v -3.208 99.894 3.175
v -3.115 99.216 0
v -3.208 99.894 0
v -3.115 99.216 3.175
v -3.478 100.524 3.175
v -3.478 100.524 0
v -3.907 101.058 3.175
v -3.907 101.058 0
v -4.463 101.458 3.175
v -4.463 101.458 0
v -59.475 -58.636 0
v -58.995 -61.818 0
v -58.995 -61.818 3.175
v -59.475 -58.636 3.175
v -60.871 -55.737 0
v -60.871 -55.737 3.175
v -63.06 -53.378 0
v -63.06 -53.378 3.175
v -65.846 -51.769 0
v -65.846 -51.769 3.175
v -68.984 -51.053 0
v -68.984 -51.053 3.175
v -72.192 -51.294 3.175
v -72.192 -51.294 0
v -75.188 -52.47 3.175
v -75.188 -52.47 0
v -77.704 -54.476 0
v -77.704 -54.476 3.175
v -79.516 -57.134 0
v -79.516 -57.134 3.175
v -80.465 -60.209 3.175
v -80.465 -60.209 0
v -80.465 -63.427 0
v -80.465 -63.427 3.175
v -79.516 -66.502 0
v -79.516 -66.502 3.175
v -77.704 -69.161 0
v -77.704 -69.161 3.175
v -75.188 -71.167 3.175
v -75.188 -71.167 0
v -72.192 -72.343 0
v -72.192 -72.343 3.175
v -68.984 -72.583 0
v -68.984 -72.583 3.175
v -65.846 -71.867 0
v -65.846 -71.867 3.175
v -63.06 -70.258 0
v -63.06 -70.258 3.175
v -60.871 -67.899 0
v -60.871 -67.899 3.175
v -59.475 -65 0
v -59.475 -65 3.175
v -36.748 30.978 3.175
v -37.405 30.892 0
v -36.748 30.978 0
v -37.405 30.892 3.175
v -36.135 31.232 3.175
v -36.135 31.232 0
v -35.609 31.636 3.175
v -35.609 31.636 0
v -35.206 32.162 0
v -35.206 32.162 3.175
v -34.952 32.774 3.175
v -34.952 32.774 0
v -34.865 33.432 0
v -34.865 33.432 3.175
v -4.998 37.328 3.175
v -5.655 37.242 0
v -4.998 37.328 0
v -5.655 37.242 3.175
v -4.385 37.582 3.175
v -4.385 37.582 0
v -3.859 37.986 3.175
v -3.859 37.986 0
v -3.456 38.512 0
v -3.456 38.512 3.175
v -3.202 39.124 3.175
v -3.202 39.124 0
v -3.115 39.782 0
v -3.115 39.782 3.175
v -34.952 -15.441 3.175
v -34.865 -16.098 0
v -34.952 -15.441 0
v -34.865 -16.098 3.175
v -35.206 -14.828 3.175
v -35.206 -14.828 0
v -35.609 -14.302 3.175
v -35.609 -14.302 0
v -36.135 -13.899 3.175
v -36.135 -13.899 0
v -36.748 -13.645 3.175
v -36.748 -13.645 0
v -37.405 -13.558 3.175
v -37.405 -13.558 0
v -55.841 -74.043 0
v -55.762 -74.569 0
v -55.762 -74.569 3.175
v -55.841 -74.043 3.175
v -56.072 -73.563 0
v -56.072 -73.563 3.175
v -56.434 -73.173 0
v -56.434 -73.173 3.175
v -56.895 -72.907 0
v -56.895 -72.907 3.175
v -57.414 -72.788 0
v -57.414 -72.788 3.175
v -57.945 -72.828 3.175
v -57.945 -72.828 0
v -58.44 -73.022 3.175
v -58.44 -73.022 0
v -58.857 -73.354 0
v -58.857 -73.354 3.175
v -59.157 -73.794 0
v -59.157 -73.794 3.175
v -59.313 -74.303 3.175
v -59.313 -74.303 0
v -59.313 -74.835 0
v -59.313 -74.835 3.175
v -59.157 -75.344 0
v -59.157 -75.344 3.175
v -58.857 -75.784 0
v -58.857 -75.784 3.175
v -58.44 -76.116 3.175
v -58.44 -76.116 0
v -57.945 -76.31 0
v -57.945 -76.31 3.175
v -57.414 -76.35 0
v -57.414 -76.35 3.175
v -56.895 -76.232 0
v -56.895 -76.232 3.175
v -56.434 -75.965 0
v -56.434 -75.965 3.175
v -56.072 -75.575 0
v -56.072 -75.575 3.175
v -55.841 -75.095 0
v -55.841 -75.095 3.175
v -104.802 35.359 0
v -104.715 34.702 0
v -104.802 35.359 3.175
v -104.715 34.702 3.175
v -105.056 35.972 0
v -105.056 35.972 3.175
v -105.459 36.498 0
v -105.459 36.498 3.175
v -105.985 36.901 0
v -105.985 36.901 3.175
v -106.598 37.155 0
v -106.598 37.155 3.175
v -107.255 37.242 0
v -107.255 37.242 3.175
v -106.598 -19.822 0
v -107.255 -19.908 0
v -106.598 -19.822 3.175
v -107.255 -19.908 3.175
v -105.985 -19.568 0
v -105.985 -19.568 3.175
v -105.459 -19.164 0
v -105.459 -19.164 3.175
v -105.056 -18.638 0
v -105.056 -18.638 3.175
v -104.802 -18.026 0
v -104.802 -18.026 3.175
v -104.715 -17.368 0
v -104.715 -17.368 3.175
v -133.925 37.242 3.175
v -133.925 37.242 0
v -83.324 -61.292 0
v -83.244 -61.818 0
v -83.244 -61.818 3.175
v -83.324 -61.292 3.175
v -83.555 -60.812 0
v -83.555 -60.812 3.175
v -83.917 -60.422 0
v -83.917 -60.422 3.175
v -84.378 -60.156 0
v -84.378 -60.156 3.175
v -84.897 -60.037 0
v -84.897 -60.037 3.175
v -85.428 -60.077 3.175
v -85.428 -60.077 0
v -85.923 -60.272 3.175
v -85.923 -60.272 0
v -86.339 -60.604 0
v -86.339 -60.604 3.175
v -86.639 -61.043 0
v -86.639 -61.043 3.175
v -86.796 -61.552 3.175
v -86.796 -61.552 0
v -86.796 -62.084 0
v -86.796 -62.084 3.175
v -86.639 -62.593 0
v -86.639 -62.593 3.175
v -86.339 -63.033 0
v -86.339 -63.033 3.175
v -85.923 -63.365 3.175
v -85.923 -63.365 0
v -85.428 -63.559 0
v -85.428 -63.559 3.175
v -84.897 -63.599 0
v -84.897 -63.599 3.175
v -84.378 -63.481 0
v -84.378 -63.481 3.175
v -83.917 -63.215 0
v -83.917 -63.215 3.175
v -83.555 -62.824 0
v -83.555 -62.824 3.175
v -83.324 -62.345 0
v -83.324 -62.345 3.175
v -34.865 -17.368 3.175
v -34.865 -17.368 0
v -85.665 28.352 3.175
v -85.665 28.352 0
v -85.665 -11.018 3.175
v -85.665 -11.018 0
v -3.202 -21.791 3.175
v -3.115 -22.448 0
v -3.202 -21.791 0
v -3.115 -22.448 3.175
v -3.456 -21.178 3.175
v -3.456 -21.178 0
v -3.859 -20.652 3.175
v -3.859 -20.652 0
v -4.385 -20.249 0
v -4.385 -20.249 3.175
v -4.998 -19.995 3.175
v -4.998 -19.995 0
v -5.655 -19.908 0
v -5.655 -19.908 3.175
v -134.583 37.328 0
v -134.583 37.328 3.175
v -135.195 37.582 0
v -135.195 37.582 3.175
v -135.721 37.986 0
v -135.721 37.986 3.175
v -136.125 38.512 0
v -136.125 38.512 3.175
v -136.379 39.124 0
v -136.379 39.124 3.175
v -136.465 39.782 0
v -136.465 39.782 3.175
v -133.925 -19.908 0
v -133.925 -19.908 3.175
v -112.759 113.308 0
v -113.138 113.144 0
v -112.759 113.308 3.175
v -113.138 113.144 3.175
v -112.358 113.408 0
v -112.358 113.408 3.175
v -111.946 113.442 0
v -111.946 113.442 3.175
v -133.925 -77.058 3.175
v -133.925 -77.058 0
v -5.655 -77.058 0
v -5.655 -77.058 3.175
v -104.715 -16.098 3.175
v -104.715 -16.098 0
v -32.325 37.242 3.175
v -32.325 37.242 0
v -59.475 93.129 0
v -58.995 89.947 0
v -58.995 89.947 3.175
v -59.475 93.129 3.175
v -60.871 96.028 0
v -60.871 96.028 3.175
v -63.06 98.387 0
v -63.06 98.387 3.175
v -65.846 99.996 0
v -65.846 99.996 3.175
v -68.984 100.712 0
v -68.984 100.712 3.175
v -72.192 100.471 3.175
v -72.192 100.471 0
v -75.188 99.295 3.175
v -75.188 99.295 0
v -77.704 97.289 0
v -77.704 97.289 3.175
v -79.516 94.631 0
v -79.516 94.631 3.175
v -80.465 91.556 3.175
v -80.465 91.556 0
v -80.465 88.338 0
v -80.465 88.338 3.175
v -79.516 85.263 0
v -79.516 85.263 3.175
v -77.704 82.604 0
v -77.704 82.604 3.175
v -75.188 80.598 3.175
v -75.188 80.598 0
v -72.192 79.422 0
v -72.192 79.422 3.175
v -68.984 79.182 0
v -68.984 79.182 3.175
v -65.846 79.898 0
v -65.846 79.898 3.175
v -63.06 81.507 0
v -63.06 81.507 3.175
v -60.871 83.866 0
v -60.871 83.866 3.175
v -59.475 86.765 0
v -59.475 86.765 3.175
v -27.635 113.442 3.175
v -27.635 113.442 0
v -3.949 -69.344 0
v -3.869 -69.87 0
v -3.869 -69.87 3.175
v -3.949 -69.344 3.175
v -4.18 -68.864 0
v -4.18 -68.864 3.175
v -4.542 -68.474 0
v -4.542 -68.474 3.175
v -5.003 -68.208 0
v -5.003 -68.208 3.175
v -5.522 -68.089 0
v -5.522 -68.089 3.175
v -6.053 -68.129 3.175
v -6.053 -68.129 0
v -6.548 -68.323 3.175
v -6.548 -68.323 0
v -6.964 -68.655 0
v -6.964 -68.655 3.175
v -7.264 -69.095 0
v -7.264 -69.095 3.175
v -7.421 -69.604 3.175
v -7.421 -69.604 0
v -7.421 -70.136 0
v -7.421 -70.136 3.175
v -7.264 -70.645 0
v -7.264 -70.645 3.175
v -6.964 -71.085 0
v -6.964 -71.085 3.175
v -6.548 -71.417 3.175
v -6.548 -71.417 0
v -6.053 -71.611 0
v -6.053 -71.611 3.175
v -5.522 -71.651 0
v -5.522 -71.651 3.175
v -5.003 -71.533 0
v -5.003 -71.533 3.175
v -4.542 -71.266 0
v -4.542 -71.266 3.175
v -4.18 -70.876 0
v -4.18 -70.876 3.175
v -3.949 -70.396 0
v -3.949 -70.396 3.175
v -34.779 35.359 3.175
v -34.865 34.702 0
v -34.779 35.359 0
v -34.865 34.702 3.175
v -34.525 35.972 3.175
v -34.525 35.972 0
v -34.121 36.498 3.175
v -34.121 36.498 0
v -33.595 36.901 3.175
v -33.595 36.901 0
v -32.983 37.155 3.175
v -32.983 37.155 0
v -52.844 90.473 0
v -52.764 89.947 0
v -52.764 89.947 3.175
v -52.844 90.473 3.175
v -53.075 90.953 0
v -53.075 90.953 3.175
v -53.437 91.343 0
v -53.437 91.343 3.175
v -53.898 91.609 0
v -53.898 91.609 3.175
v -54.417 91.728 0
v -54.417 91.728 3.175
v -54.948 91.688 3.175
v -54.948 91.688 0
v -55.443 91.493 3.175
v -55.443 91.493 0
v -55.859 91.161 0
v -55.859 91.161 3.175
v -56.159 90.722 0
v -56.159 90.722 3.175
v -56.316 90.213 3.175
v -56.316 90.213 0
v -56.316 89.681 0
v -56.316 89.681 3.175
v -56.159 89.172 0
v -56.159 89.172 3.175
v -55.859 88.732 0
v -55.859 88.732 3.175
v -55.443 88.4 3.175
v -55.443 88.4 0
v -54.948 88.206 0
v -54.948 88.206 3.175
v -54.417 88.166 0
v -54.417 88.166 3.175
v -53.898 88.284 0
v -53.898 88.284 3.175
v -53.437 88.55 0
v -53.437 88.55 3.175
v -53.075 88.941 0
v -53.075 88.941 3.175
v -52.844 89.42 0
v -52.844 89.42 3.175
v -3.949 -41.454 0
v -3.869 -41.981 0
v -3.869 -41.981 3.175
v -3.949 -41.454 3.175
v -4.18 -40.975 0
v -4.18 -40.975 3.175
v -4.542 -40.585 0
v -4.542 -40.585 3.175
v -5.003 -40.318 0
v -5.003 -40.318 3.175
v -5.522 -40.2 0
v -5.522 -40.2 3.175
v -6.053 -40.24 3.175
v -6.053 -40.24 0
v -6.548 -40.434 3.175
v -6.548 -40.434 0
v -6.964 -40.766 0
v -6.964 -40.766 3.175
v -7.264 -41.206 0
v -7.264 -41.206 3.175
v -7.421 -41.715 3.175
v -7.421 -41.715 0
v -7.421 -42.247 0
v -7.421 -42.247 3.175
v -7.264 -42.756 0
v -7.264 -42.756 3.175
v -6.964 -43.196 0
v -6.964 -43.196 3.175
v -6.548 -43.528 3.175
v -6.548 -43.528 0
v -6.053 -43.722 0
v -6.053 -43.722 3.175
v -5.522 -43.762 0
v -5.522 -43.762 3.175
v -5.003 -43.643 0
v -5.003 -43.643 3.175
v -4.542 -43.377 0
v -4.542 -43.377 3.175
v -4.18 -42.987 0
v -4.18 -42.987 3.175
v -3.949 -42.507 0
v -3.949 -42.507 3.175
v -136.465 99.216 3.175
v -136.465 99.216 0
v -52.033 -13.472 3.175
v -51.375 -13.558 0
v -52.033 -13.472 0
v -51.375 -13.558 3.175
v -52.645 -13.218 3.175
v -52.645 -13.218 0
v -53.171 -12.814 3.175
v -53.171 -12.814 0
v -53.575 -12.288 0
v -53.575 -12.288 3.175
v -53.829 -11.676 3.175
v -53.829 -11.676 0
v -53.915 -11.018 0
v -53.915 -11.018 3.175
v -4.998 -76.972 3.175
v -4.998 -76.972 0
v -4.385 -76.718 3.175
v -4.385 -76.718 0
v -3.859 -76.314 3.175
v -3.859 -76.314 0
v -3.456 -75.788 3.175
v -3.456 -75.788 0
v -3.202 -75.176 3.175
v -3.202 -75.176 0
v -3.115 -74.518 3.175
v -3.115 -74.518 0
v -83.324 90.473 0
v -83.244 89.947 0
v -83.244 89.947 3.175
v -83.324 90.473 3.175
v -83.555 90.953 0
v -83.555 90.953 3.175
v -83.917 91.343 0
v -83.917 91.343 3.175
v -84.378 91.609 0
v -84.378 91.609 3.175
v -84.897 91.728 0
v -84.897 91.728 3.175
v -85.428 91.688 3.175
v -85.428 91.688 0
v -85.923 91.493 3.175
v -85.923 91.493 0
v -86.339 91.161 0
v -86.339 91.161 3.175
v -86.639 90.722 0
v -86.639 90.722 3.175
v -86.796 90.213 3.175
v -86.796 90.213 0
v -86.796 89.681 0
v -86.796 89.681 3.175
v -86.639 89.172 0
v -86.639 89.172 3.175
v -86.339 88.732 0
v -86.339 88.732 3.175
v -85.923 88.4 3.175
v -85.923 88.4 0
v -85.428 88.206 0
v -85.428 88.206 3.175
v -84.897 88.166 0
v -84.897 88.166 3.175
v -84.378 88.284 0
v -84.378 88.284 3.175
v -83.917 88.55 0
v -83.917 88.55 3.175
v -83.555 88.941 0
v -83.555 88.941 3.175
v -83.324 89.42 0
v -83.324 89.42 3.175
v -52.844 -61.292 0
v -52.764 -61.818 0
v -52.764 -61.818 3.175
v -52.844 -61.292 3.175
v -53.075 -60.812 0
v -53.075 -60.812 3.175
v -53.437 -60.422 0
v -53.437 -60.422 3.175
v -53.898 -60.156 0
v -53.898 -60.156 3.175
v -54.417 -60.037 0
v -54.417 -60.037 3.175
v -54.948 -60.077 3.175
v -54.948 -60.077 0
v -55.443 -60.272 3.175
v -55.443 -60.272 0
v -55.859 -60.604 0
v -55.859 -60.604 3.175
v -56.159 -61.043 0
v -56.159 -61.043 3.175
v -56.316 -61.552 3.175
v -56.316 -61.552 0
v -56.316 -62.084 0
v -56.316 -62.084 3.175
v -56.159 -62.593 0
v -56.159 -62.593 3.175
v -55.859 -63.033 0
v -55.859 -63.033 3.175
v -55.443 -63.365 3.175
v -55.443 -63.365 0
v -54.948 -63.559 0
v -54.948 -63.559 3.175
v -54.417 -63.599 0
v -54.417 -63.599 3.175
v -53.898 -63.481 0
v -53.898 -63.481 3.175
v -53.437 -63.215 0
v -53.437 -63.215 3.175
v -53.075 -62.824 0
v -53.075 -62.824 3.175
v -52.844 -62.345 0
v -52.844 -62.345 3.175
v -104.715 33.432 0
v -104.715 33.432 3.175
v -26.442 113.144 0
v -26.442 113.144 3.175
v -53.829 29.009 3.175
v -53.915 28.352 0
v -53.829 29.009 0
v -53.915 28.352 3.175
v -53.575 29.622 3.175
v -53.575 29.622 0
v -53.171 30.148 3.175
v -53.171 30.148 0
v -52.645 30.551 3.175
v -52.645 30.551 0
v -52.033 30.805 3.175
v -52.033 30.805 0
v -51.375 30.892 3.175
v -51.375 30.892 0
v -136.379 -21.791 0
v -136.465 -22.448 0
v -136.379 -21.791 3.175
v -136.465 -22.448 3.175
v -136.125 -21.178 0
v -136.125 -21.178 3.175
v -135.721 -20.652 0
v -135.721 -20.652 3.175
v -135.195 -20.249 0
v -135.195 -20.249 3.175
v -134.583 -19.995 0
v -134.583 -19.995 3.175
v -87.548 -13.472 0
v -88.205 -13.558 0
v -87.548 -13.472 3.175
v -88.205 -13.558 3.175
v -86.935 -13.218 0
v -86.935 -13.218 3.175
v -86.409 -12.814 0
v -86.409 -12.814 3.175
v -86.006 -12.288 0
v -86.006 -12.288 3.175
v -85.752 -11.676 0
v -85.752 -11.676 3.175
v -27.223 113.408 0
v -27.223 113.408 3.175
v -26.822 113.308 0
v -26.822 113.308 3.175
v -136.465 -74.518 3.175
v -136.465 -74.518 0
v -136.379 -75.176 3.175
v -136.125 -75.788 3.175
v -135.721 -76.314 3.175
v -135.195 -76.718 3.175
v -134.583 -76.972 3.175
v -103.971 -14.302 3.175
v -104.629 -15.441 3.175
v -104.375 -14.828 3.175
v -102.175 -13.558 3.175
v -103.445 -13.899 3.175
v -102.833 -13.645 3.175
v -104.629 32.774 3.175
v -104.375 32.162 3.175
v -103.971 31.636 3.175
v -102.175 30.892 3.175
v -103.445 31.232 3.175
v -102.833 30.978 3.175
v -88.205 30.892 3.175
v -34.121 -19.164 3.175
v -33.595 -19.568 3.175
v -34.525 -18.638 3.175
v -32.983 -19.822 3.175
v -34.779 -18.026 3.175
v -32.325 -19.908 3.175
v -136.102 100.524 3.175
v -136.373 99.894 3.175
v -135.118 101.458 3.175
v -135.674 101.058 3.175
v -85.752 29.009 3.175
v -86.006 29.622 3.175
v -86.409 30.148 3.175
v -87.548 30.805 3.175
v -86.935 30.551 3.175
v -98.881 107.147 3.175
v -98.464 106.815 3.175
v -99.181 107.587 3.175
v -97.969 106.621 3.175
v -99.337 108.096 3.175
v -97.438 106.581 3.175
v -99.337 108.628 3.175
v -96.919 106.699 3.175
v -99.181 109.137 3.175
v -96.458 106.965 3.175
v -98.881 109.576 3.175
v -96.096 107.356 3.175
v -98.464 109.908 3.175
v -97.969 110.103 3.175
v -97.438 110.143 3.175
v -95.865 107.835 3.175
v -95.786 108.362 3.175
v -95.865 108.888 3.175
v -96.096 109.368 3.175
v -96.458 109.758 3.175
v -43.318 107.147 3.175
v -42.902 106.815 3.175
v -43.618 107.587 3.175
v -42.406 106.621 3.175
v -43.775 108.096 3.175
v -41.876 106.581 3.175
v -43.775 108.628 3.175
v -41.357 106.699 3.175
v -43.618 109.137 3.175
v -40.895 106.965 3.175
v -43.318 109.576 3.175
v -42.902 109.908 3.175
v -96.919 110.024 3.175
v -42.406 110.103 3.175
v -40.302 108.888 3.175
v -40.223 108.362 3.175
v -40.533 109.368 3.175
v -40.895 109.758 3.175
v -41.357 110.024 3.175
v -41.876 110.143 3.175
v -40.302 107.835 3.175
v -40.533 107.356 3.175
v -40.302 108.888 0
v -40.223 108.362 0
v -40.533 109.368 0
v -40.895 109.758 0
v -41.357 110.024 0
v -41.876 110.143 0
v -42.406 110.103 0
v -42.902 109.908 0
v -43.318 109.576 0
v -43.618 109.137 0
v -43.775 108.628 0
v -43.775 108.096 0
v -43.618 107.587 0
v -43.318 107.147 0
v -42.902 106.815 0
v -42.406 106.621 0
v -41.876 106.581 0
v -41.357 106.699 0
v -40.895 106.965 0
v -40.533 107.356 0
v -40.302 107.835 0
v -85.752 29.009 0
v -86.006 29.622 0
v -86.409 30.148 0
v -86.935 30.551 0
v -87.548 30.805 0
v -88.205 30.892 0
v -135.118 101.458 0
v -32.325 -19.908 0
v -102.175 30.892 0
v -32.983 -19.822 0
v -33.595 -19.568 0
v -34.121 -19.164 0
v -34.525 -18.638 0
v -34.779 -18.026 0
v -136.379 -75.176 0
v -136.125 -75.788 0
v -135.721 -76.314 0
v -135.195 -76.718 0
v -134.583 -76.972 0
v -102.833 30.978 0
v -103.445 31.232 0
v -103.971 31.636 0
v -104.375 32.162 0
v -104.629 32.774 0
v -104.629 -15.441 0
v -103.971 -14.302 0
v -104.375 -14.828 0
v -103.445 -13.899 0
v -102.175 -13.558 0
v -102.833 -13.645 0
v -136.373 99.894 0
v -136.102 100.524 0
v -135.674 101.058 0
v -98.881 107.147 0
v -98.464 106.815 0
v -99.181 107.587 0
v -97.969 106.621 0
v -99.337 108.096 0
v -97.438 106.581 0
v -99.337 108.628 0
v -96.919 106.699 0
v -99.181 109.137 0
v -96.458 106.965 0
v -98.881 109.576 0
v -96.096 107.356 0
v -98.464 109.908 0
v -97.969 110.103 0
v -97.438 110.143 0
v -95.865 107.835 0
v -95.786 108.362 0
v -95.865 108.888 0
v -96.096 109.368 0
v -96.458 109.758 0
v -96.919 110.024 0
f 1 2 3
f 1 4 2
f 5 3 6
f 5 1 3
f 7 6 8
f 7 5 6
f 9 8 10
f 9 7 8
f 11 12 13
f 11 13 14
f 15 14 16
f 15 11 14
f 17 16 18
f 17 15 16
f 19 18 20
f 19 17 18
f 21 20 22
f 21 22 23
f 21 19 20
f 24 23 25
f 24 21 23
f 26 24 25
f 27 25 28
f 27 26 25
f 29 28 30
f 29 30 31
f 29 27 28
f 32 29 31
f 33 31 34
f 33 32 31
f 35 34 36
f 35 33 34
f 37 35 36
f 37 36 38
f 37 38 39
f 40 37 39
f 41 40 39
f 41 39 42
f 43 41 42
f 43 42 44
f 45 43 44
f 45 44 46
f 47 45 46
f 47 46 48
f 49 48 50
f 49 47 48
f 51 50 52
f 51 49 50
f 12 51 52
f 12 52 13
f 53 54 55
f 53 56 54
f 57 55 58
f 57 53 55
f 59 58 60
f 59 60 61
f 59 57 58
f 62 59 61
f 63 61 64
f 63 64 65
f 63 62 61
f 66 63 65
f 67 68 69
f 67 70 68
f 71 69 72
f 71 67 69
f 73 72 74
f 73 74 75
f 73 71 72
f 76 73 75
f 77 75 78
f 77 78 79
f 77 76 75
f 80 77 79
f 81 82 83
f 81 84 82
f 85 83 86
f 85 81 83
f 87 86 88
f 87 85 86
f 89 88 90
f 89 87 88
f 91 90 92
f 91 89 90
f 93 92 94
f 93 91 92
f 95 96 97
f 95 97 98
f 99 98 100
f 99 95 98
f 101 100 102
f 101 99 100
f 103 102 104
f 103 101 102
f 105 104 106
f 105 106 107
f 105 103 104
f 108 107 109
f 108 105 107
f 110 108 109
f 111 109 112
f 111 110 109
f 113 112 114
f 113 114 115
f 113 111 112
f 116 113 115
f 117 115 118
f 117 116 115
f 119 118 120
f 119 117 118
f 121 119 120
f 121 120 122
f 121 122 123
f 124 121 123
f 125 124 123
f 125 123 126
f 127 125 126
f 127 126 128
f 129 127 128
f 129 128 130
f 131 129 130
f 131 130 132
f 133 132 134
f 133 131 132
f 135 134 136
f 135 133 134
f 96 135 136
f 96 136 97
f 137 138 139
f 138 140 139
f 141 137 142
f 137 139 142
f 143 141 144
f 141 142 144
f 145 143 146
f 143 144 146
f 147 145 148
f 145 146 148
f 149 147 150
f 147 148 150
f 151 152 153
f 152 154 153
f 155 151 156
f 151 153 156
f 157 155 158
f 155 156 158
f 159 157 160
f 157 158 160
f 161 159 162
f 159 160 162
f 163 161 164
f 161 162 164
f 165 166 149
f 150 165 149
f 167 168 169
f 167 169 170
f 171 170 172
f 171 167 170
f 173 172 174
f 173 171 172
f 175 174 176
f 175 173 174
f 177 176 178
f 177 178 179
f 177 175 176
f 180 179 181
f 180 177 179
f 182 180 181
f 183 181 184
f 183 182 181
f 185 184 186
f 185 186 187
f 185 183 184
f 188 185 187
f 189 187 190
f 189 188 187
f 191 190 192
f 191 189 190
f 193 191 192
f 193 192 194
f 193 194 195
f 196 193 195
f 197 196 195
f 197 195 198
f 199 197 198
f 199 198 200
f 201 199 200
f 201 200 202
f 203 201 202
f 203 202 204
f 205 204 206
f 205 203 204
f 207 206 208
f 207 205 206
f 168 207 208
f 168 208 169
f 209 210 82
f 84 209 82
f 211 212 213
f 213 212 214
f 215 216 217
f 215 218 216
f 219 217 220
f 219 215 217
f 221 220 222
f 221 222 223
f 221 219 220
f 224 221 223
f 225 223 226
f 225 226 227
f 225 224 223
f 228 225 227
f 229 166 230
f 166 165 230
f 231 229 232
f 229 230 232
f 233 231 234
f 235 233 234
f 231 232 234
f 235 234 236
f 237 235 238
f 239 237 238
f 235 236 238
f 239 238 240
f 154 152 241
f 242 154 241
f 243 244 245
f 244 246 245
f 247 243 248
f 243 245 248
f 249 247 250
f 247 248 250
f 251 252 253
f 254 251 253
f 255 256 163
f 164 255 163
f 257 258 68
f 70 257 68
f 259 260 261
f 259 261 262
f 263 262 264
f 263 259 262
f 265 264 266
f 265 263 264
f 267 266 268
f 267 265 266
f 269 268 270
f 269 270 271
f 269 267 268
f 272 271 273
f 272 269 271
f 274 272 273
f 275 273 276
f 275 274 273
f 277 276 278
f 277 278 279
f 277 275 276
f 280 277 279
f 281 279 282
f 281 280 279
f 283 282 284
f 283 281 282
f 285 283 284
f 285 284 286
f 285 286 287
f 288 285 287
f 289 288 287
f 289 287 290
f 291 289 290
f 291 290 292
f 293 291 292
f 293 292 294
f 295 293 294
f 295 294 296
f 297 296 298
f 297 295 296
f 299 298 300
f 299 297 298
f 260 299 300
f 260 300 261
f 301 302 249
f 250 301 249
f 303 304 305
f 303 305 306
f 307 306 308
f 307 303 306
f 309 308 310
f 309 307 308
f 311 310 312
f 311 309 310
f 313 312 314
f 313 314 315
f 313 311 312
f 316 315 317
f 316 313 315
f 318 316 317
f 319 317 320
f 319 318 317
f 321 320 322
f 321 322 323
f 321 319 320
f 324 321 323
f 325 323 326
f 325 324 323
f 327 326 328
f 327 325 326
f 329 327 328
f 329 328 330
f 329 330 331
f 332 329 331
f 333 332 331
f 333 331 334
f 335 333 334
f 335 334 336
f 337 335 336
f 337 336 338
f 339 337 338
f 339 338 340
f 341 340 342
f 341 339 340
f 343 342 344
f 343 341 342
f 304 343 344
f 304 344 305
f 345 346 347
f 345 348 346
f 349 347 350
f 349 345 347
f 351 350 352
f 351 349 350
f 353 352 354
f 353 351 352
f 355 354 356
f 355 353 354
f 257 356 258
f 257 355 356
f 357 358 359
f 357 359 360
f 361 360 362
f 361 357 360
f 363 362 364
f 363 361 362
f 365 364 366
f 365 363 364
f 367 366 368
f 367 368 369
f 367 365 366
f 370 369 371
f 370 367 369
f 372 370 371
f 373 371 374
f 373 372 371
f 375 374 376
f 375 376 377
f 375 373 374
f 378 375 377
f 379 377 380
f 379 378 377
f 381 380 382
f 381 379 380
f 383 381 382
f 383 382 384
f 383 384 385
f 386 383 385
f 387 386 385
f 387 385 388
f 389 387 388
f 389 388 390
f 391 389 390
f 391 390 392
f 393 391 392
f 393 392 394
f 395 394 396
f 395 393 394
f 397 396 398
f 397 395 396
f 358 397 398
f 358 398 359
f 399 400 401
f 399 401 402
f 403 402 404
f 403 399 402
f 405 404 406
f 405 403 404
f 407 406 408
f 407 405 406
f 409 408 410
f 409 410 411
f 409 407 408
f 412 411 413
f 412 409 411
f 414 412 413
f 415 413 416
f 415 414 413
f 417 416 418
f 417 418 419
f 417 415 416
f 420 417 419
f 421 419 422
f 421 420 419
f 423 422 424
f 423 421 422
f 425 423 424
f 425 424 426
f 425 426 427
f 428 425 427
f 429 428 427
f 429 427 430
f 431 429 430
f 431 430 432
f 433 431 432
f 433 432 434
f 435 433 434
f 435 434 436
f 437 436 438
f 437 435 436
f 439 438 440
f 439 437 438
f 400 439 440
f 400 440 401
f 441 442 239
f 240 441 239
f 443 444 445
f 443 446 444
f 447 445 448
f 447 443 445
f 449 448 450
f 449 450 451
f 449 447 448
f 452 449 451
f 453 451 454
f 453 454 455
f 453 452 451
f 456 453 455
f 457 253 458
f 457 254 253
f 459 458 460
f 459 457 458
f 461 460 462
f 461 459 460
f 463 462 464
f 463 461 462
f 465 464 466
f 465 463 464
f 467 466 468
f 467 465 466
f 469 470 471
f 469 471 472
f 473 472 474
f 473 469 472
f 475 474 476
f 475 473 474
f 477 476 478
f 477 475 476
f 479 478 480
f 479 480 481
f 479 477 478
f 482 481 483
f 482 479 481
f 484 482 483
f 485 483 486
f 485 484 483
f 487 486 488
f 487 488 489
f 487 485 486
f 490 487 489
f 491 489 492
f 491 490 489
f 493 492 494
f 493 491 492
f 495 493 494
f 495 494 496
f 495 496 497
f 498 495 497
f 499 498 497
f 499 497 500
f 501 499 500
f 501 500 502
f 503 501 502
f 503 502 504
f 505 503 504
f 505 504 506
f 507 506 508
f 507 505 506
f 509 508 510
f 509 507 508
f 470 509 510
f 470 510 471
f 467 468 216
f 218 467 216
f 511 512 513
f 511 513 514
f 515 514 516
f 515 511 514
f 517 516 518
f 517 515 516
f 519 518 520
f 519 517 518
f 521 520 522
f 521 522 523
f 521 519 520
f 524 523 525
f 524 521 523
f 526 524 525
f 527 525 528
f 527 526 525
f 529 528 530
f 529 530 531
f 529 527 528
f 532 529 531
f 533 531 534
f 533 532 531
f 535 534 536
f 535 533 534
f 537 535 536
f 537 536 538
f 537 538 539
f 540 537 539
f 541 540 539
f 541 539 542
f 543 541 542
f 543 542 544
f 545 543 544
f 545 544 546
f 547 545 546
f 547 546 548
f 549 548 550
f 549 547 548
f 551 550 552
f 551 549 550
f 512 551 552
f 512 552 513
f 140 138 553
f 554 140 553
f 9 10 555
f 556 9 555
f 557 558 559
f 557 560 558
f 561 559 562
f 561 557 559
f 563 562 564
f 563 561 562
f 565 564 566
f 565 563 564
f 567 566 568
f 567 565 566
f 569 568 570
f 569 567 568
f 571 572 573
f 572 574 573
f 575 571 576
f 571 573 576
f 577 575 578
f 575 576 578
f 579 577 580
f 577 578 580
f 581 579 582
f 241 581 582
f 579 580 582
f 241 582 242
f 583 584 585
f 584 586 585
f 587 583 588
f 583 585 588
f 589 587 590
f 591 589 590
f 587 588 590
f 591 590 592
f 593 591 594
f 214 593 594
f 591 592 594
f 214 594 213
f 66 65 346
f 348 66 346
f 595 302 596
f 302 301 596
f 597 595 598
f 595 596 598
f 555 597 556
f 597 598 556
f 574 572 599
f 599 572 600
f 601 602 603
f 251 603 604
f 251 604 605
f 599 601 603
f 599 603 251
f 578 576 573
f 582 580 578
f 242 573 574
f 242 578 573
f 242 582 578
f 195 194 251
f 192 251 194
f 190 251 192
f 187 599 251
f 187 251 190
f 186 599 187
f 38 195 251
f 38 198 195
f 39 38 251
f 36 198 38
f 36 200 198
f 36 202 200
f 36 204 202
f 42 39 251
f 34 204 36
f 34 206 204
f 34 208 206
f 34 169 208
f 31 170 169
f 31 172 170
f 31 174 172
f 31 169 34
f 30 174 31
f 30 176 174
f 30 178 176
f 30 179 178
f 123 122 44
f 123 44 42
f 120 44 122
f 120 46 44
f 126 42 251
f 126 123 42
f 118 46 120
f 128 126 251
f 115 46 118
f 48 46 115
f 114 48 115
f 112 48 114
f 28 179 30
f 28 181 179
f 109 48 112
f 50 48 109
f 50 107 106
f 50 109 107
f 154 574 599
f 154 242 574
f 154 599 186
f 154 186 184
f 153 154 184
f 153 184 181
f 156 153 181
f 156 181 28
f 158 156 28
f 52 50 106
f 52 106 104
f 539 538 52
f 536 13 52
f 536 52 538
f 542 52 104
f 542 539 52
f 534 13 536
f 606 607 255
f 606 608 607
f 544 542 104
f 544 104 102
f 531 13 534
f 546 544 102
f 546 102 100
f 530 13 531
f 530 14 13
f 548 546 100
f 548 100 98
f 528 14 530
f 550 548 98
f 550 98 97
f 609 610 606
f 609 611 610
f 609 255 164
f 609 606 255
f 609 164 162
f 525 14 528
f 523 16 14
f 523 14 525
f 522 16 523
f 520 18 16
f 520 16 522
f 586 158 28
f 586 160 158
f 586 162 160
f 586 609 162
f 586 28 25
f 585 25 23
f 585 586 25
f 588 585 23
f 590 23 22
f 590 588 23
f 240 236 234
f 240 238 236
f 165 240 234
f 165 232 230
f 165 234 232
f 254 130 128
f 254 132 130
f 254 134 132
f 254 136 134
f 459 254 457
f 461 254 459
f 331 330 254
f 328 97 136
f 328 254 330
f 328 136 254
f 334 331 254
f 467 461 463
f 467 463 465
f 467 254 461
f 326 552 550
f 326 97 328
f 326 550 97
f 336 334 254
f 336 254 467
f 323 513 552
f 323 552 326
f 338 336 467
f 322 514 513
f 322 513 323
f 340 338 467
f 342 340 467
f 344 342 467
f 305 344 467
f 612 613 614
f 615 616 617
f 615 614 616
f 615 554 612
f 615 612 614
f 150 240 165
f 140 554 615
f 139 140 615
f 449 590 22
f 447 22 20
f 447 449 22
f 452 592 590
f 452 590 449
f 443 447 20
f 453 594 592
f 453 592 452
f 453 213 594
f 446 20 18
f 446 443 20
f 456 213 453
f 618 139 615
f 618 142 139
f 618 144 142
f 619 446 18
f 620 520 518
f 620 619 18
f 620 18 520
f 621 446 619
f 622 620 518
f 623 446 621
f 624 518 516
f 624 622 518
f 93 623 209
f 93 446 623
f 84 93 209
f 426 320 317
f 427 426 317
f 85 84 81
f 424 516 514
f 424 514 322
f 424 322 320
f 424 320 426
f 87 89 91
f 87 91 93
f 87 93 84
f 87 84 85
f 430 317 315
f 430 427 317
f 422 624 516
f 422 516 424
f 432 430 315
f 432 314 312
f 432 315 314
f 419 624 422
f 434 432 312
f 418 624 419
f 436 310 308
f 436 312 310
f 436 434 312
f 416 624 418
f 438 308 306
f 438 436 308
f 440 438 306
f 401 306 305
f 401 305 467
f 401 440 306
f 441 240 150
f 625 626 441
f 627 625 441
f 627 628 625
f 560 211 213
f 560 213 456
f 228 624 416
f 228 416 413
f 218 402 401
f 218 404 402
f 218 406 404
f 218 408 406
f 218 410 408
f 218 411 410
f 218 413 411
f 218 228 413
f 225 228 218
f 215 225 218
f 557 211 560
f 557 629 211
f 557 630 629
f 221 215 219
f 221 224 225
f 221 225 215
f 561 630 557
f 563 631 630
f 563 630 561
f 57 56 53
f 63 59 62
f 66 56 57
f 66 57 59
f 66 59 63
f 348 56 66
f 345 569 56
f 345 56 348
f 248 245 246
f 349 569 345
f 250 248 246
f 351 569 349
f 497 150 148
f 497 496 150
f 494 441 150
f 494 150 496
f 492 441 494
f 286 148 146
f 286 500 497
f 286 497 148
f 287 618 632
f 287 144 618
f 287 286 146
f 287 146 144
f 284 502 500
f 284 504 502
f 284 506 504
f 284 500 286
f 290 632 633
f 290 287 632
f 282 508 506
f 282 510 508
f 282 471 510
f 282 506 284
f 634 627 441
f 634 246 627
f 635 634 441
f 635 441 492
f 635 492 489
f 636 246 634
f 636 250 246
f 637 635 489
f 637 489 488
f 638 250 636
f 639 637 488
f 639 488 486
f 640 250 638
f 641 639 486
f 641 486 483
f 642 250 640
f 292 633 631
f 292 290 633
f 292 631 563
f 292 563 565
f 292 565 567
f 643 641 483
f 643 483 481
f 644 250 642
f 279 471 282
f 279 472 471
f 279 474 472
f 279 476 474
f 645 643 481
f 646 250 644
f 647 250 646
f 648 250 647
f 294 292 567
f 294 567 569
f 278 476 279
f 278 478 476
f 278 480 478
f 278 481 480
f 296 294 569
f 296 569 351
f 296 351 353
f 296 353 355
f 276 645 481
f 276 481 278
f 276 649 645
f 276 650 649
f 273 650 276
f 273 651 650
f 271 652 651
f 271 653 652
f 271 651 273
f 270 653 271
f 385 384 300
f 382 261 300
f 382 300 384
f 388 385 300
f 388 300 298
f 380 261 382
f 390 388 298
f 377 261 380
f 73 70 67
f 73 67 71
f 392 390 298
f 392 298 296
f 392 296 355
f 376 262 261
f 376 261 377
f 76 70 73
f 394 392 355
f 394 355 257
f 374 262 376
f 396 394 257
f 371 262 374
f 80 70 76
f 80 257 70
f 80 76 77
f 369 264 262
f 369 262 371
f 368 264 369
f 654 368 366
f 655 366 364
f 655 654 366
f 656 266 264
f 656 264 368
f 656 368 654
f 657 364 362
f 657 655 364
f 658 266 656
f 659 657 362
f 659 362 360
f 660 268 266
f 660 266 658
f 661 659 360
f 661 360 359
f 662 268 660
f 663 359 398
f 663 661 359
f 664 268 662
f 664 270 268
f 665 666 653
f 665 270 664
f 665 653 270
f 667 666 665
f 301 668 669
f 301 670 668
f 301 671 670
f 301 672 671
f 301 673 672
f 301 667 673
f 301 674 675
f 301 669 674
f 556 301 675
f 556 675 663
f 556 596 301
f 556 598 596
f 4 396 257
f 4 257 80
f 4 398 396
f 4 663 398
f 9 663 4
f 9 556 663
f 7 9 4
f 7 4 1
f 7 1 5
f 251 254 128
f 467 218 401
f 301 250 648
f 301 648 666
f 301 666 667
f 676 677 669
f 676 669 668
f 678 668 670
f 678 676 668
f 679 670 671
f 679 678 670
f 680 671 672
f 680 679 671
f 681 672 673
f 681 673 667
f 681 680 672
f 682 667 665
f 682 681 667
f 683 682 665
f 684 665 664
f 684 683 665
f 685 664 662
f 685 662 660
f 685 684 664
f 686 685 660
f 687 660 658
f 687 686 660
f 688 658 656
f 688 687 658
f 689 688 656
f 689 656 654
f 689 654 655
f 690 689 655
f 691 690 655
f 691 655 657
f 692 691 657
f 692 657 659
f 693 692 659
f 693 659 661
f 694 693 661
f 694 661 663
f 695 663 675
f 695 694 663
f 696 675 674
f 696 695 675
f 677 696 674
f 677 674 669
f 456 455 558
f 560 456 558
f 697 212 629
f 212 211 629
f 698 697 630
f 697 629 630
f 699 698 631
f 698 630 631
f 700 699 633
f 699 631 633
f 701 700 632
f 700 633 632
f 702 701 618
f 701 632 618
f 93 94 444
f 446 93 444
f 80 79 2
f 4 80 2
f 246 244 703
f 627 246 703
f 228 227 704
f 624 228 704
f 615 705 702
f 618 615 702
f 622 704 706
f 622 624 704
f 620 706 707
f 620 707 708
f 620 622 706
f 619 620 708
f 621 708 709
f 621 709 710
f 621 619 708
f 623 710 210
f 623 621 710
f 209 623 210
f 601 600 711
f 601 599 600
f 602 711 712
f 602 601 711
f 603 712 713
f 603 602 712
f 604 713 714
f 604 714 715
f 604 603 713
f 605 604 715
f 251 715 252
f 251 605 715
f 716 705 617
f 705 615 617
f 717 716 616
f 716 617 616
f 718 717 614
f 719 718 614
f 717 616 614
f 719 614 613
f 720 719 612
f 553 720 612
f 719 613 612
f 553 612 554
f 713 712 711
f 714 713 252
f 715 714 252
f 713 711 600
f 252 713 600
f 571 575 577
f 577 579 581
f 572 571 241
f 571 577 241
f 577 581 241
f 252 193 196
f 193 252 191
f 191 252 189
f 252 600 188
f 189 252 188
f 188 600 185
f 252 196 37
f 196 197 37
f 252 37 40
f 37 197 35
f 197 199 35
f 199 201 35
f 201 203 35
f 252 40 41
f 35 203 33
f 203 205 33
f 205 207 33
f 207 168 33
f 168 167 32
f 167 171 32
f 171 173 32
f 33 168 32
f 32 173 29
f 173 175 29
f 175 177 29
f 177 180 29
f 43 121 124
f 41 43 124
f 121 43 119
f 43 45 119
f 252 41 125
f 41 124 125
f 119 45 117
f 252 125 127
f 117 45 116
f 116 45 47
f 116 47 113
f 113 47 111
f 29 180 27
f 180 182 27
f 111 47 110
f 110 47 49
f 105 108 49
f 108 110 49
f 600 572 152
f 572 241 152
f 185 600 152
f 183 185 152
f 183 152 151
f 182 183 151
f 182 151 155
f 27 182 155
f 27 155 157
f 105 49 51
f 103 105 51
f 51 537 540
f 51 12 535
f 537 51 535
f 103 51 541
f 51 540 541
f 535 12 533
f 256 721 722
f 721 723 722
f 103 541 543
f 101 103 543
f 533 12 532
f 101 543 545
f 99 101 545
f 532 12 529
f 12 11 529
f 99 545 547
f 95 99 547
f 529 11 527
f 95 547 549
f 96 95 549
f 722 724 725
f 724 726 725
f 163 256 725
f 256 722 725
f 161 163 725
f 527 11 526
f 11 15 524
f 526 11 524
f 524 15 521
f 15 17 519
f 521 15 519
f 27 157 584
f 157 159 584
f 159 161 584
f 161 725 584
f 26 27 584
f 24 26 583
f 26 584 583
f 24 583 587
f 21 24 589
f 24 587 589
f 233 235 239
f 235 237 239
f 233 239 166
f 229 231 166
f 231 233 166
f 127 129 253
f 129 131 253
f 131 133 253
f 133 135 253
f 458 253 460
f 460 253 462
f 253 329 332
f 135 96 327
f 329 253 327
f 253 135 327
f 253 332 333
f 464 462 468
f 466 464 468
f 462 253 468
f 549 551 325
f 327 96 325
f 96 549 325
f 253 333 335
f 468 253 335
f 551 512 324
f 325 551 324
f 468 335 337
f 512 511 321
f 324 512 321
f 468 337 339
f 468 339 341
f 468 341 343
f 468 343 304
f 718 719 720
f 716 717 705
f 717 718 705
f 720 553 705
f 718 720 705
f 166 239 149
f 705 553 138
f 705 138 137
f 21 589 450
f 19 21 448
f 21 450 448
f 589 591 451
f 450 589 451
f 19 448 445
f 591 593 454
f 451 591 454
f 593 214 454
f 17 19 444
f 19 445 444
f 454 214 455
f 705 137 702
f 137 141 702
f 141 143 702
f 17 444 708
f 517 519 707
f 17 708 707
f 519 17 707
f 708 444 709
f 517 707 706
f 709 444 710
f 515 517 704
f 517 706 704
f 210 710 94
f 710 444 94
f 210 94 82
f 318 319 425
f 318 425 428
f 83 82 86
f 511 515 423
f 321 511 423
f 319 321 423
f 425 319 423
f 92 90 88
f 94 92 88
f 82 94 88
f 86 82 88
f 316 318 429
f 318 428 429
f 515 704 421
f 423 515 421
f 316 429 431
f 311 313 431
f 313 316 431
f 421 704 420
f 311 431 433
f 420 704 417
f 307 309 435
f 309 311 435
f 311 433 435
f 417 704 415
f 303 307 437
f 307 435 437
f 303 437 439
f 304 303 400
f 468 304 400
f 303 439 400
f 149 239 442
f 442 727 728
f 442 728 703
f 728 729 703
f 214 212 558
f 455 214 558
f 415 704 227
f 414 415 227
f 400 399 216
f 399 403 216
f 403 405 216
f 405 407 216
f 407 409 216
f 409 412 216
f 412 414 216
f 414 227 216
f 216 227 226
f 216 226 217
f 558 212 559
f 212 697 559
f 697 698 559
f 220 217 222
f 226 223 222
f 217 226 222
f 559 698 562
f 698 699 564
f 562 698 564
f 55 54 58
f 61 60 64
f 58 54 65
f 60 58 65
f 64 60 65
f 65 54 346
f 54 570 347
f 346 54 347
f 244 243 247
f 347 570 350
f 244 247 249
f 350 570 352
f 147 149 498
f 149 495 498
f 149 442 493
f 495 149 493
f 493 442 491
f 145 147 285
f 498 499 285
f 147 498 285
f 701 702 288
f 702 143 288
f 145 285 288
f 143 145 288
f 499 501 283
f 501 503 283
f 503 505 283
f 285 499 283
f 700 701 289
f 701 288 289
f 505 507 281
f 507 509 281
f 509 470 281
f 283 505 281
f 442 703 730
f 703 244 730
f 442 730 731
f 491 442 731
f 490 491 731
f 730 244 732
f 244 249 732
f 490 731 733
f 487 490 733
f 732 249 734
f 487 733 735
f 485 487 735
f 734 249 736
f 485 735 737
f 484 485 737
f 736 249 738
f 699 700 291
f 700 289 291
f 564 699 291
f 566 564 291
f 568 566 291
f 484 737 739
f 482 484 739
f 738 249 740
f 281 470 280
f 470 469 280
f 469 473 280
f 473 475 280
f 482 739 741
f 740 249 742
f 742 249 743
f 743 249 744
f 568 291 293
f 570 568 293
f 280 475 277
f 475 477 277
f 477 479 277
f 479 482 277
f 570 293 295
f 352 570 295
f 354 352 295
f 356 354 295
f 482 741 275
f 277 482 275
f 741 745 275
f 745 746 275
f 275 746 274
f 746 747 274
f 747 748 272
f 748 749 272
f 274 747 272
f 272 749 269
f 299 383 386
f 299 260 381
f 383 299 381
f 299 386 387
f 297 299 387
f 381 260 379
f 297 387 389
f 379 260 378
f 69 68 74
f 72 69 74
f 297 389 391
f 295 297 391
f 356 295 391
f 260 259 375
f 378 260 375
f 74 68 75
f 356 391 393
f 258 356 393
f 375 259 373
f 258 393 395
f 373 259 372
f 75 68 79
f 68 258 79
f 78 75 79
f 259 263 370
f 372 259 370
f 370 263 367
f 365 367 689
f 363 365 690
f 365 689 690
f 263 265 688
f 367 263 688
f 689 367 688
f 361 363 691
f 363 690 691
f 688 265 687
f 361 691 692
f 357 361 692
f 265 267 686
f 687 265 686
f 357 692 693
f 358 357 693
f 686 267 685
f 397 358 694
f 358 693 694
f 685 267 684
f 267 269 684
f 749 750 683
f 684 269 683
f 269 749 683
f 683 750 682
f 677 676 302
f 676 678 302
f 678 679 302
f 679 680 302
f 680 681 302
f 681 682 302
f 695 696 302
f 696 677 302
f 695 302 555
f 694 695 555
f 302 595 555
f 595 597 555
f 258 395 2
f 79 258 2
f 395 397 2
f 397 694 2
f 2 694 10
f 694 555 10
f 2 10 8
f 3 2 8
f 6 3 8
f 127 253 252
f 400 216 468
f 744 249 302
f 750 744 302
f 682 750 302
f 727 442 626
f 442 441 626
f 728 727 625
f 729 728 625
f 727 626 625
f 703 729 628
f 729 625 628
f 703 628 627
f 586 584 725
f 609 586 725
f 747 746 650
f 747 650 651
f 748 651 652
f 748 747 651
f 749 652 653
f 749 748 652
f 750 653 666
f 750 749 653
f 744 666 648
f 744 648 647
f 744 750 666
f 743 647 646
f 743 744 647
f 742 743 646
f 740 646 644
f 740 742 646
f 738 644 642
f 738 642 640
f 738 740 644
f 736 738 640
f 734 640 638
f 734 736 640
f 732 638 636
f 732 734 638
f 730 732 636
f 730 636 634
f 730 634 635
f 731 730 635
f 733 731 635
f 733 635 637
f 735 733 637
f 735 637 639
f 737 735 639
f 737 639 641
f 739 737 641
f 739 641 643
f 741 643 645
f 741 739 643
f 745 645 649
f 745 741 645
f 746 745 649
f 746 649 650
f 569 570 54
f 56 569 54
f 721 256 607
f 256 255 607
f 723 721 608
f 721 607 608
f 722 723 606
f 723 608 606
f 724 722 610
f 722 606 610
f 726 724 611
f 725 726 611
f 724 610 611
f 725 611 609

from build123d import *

# Parameters (mm, degrees)
F0_R     = 1.7859375
F0_R_2   = 10.795
F1_DEPTH = 3.175
F2_R     = 2.54


with BuildPart() as f1:
    # F0 (on Top) → F1 (new body)
    with BuildSketch(Plane.XY):
        Polygon((-136.4652514458, -19.908263123), (-136.4652514458, -77.058263123), (-3.1152514458, -77.058263123), (-3.1152514458, -19.908263123), (-34.8652514458, -19.908263123), (-34.8652514458, -13.558263123), (-53.9152514458, -13.558263123), (-53.9152514458, 30.891736877), (-34.8652514458, 30.891736877), (-34.8652514458, 37.241736877), (-3.1152514458, 37.241736877), (-3.1152514458, 100.741736877), (-27.0015158653, 113.441736877), (-112.5789870262, 113.441736877), (-136.4652514458, 100.741736877), (-136.4652514458, 37.241736877), (-104.7152514458, 37.241736877), (-104.7152514458, 30.891736877), (-85.6652514458, 30.891736877), (-85.6652514458, -13.558263123), (-104.7152514458, -13.558263123), (-104.7152514458, -19.908263123), align=None)
        with Locations((-85.0302514458, -61.818263123)):
            Circle(F0_R, mode=Mode.SUBTRACT)
        with Locations((-57.5474514458, -74.569063123)):
            Circle(F0_R, mode=Mode.SUBTRACT)
        with Locations((-69.7902514458, -61.818263123)):
            Circle(F0_R_2, mode=Mode.SUBTRACT)
        with Locations((-54.5502514458, -61.818263123)):
            Circle(F0_R, mode=Mode.SUBTRACT)
        with Locations((-5.6552514458, -69.870063123)):
            Circle(F0_R, mode=Mode.SUBTRACT)
        with Locations((-5.6552514458, -41.980863123)):
            Circle(F0_R, mode=Mode.SUBTRACT)
        with Locations((-97.5715014458, 108.361736877)):
            Circle(F0_R, mode=Mode.SUBTRACT)
        with Locations((-85.0302514458, 89.946736877)):
            Circle(F0_R, mode=Mode.SUBTRACT)
        with Locations((-69.7902514458, 89.946736877)):
            Circle(F0_R_2, mode=Mode.SUBTRACT)
        with Locations((-54.5502514458, 89.946736877)):
            Circle(F0_R, mode=Mode.SUBTRACT)
        with Locations((-42.0090014458, 108.361736877)):
            Circle(F0_R, mode=Mode.SUBTRACT)
    extrude(amount=F1_DEPTH)

    # F2
    f2_edges = [f1.edges().sort_by_distance(p)[0] for p in [
        (-34.865251, 37.241737, 1.5875),
        (-3.115251, -19.908263, 1.5875),
        (-3.115251, 37.241737, 1.5875),
        (-3.115251, -77.058263, 1.5875),
        (-136.465251, -77.058263, 1.5875),
        (-3.115251, 100.741737, 1.5875),
        (-27.001516, 113.441737, 1.5875),
        (-112.578987, 113.441737, 1.5875),
        (-136.465251, 100.741737, 1.5875),
        (-136.465251, 37.241737, 1.5875),
        (-104.715251, 37.241737, 1.5875),
        (-136.465251, -19.908263, 1.5875),
        (-53.915251, 30.891737, 1.5875),
        (-53.915251, -13.558263, 1.5875),
        (-85.665251, -13.558263, 1.5875),
        (-104.715251, -13.558263, 1.5875),
        (-85.665251, 30.891737, 1.5875),
        (-34.865251, -13.558263, 1.5875),
        (-104.715251, 30.891737, 1.5875),
        (-104.715251, -19.908263, 1.5875),
        (-34.865251, -19.908263, 1.5875),
        (-34.865251, 30.891737, 1.5875),
    ]]
    fillet(f2_edges, radius=F2_R)


solid = f1.part
